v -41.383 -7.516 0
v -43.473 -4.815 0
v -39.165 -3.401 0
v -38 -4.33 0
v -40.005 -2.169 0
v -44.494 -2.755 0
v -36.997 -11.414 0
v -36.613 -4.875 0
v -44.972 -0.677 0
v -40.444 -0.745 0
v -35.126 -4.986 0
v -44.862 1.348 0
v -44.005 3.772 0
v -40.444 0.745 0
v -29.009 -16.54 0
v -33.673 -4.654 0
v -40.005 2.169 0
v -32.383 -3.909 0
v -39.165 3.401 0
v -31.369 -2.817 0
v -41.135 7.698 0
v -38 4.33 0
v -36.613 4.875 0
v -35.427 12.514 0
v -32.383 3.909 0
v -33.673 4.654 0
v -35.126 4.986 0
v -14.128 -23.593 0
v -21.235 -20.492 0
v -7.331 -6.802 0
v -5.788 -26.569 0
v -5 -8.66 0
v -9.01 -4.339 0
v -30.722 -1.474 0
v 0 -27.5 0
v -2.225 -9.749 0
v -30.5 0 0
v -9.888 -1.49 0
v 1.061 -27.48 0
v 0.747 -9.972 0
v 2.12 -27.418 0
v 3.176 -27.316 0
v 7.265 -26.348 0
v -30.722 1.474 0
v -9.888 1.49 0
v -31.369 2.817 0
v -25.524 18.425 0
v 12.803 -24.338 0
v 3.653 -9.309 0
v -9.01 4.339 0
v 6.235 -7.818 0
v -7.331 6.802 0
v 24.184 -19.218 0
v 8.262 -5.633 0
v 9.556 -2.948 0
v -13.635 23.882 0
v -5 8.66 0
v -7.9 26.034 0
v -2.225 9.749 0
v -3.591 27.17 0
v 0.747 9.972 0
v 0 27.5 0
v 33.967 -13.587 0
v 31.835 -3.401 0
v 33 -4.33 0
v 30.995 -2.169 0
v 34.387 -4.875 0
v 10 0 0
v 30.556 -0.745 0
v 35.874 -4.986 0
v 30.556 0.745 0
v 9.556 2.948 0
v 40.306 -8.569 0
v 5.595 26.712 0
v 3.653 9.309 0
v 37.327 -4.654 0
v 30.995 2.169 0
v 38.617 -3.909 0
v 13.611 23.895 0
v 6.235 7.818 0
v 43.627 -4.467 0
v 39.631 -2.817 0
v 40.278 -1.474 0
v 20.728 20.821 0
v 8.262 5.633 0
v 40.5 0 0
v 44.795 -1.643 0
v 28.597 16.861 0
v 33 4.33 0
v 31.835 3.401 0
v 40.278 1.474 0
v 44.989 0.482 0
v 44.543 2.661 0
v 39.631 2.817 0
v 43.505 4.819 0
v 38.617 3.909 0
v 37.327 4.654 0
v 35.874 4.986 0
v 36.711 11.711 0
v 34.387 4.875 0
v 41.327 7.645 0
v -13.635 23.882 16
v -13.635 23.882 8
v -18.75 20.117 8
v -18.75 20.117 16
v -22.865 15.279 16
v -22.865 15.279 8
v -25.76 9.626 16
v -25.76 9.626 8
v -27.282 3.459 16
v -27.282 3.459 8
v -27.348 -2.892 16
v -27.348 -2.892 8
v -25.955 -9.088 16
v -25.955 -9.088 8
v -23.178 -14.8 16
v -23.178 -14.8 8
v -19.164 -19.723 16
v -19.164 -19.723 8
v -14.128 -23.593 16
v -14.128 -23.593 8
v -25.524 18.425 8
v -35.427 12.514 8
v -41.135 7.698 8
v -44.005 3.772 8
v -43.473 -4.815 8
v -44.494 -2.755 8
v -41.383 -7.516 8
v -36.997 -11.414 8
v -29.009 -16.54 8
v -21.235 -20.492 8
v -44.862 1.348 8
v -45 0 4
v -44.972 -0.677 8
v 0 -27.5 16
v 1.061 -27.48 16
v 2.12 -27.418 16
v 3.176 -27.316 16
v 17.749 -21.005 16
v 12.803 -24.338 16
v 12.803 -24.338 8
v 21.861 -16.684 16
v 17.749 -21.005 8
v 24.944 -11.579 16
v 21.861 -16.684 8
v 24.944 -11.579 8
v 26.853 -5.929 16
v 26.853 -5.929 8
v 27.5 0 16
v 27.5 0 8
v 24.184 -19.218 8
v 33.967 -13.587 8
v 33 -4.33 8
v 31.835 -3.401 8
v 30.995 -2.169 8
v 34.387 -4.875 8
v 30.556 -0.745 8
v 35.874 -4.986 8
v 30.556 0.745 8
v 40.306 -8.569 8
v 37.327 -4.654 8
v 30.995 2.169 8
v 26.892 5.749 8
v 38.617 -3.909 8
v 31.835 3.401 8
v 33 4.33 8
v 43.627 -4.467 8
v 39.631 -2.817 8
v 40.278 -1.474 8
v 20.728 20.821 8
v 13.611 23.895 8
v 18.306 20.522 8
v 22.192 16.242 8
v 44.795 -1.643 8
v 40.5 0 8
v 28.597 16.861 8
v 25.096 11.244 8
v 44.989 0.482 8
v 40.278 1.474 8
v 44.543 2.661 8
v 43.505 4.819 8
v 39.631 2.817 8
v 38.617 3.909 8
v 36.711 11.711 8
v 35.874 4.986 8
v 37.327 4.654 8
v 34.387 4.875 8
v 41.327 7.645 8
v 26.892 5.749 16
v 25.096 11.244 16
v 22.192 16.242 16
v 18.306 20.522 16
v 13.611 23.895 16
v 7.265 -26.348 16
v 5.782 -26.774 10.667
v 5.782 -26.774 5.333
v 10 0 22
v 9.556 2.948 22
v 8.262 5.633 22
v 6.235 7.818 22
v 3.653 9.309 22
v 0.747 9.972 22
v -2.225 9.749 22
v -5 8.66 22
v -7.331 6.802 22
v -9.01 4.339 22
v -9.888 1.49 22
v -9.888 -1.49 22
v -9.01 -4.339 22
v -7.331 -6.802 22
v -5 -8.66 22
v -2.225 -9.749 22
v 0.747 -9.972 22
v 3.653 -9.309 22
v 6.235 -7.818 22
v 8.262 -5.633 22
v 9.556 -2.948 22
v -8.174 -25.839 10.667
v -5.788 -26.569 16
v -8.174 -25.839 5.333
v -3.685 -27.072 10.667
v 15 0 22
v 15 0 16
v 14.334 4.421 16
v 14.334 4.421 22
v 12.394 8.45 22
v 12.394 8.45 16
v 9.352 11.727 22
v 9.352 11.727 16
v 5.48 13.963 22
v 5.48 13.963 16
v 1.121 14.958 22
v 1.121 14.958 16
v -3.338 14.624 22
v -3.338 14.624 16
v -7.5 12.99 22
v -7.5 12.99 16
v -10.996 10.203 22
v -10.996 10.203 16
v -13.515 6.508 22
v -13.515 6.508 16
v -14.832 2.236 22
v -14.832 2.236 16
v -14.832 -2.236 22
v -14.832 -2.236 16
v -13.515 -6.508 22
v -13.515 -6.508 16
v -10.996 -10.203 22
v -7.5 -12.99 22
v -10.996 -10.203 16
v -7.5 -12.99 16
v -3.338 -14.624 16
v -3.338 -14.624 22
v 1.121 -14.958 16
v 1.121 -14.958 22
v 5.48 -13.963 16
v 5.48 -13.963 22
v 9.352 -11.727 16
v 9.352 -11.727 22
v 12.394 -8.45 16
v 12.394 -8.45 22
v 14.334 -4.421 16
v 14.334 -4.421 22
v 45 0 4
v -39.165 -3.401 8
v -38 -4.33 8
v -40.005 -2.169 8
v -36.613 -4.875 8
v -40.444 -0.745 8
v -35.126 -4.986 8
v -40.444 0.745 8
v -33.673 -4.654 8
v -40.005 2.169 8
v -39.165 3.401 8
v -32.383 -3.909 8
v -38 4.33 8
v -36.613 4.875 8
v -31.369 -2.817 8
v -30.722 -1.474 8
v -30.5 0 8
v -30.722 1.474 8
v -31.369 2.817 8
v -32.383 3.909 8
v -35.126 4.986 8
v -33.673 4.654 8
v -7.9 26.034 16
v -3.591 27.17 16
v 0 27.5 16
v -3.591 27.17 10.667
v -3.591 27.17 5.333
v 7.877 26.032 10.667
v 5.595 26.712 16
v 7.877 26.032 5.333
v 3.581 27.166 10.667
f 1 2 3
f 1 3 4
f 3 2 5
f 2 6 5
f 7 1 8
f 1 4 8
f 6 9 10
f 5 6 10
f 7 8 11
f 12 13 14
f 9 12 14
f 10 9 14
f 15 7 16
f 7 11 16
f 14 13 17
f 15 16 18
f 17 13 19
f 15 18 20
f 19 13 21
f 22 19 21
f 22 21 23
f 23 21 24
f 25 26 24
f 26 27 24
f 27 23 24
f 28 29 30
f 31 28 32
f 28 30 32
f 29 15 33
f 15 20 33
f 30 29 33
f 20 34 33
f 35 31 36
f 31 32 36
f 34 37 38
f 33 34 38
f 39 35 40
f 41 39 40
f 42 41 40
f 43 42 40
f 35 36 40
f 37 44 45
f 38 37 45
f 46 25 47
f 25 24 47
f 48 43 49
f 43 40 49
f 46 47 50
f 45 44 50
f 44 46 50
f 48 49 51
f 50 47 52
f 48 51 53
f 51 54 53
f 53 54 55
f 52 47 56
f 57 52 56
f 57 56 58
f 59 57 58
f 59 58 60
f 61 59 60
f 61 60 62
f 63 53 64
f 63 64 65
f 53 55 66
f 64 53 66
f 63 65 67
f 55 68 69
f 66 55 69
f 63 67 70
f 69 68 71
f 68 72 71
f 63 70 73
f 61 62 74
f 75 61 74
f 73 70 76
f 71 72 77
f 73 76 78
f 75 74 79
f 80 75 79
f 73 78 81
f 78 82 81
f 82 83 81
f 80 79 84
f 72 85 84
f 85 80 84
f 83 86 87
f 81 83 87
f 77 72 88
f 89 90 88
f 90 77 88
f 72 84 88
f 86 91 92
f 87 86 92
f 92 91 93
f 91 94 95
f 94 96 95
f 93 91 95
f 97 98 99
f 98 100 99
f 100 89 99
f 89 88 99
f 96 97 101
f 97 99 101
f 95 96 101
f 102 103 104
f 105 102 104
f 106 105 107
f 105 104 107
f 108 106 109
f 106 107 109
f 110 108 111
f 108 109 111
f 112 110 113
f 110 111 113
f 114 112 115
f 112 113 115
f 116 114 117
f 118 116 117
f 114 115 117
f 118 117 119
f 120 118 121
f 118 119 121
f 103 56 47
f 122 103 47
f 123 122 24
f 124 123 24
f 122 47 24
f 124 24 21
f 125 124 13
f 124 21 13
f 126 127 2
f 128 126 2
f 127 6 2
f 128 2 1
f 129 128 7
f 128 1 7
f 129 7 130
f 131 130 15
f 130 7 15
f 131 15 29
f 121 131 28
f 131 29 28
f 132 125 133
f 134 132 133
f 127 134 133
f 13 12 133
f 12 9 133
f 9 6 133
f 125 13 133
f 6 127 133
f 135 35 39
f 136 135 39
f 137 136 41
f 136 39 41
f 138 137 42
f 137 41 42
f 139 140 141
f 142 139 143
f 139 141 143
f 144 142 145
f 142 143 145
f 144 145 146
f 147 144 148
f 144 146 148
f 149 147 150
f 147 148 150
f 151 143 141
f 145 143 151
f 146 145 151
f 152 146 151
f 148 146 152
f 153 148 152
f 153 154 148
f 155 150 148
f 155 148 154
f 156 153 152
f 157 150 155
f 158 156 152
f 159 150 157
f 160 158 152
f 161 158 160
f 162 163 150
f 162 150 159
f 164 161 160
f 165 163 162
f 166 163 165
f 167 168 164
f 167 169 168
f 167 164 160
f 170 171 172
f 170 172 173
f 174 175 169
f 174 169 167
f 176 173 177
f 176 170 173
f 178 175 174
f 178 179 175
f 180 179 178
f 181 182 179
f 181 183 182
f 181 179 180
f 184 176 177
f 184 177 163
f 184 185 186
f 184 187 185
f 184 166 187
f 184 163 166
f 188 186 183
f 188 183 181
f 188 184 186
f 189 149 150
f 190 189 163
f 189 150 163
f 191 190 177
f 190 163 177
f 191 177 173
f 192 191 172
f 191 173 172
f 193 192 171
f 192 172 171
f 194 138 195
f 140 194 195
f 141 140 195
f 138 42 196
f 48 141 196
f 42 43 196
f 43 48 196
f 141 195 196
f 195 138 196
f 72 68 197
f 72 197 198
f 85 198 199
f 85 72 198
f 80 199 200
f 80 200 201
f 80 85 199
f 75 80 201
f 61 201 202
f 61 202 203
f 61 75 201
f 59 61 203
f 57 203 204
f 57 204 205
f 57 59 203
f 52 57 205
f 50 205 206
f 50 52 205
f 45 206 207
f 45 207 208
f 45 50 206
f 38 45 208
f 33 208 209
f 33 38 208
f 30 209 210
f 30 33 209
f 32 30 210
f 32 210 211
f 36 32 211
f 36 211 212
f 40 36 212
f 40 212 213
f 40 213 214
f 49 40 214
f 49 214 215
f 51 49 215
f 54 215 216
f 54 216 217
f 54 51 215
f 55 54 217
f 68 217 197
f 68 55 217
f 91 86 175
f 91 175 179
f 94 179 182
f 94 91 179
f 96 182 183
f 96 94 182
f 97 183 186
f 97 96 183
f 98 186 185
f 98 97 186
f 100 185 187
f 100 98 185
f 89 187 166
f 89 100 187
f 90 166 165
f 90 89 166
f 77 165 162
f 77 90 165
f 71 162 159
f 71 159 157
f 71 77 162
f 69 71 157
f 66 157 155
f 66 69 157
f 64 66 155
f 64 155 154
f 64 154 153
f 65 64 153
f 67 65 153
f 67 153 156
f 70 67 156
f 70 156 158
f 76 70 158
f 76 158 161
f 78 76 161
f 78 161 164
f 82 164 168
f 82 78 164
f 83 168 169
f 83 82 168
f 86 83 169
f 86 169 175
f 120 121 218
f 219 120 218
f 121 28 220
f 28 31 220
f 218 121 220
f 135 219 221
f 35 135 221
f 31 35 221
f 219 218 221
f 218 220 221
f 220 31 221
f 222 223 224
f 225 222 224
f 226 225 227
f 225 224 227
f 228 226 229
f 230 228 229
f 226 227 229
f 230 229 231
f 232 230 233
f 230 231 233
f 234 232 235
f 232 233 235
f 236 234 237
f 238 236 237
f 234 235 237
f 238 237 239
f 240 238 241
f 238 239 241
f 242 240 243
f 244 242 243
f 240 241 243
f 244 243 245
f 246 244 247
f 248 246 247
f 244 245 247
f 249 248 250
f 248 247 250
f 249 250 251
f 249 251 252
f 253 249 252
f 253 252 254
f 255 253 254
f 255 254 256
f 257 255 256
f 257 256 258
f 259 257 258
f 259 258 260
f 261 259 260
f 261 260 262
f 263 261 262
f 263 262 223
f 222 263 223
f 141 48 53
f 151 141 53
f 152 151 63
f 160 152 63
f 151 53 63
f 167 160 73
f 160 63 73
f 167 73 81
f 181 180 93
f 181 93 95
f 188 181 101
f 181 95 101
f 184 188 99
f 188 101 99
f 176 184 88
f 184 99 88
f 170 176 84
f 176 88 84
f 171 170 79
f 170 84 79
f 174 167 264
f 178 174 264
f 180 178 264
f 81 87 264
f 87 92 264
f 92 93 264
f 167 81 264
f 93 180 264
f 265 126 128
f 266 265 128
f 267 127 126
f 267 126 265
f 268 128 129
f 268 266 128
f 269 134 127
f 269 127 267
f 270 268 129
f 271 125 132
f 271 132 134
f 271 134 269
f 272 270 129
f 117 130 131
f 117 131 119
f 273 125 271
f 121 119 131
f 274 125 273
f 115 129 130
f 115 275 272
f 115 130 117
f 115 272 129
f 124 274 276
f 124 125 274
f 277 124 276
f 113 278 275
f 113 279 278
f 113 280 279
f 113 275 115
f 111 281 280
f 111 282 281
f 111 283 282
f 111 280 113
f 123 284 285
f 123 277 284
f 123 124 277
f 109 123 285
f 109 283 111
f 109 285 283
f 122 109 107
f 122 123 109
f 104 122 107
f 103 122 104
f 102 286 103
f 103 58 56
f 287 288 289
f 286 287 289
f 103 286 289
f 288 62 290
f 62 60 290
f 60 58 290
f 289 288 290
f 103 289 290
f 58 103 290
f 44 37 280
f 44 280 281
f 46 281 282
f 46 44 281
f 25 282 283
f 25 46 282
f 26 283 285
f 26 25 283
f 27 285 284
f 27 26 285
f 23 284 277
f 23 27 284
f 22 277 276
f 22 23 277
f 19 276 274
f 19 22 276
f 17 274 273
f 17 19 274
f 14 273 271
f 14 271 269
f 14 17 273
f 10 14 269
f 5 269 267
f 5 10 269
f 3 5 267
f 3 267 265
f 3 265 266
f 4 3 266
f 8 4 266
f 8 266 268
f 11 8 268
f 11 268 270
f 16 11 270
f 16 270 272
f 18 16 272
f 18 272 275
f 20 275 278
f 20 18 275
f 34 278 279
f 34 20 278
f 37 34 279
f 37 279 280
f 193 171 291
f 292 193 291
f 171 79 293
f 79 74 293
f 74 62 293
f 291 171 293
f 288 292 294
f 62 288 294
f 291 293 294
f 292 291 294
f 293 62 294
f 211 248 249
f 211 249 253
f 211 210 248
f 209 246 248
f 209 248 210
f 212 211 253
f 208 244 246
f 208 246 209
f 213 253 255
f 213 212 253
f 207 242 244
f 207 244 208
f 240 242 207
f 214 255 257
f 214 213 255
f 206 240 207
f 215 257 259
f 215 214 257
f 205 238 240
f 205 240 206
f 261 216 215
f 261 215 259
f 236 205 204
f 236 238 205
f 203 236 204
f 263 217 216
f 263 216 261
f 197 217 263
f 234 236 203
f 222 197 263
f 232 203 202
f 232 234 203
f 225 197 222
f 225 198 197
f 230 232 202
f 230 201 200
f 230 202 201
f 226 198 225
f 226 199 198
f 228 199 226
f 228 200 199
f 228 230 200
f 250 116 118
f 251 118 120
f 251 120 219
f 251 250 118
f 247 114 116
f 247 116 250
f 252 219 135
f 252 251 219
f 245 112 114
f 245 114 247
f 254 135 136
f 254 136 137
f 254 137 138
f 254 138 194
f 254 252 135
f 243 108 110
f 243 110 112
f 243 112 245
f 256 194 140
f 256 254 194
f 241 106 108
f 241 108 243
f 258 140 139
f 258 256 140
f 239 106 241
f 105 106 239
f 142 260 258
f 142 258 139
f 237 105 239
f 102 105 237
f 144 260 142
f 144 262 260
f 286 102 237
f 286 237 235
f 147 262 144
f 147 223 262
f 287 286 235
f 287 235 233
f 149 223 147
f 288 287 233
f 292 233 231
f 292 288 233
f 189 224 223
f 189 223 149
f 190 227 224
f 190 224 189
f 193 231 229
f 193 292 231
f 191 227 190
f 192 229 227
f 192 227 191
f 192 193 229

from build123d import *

# Parameters (mm, degrees)
F0_R     = 5
F1_DEPTH = 8
F0_R_2   = 15
F2_DEPTH = 16
F0_R_3   = 10
F3_DEPTH = 22


with BuildPart() as f1:
    # F0 (on Top) → F1 (new body)
    with BuildSketch(Plane.XY):
        with BuildLine():
            ThreePointArc((-14.128437921, -23.593160914), (-27.4985146505, 0.2858181561), (-13.6349863045, 23.8817325267))
            add(Edge.make_bspline(
                [(-13.6349863045, 23.8817325267), (-24.80887432, 19.3175732433), (-64.9074286316, -0.0208843712), (-25.3732238209, -18.9980920778), (-14.128437921, -23.593160914)],
                knots=[0.0936300618, 0.0936300618, 0.0936300618, 0.0936300618, 0.2501498665, 0.4055392908, 0.4055392908, 0.4055392908, 0.4055392908], degree=3))
        make_face()
        with Locations((-35.5, 0)):
            Circle(F0_R, mode=Mode.SUBTRACT)
    extrude(amount=F1_DEPTH)



with BuildPart() as f1b:
    # F0 (on Top) → F1, piece 2 (new body)
    with BuildSketch(Plane.XY):
        with BuildLine():
            add(Edge.make_bspline(
                [(12.8034054524, -24.3376828976), (23.9154797228, -19.8963977435), (65.6301130949, 0.0418102706), (24.8166936559, 19.3644997944), (13.6114848151, 23.8951350933)],
                knots=[0.5915126143, 0.5915126143, 0.5915126143, 0.5915126143, 0.7498837302, 0.9064567635, 0.9064567635, 0.9064567635, 0.9064567635], degree=3))
            ThreePointArc((13.6114848151, 23.8951350933), (23.7756790904, 13.8190840432), (27.5, 0))
            ThreePointArc((27.5, 0), (23.5408543806, -14.2154203255), (12.8034054524, -24.3376828976))
        make_face()
        with Locations((35.5, 0)):
            Circle(F0_R, mode=Mode.SUBTRACT)
    extrude(amount=F1_DEPTH)


with BuildPart() as f1_1:
    add(f1.part)

    add(f1b.part)  # F2 merges F1b
    # F0 (on Top) → F2 (join)
    with BuildSketch(Plane.XY):
        with BuildLine():
            add(Edge.make_bspline(
                [(13.6114848151, 23.8951350933), (6.9170274268, 26.6019248892), (3.4653354317, 27.4970657947), (0, 27.5)],
                knots=[0.9064567635, 0.9064567635, 0.9064567635, 0.9064567635, 1, 1, 1, 1], degree=3))
            add(Edge.make_bspline(
                [(0, 27.5), (-3.4685519028, 27.5029369288), (-6.9507725812, 26.6120101235), (-13.6349863045, 23.8817325267)],
                knots=[0, 0, 0, 0, 0.0936300618, 0.0936300618, 0.0936300618, 0.0936300618], degree=3))
            ThreePointArc((-13.6349863045, 23.8817325267), (-27.4985146505, 0.2858181561), (-14.128437921, -23.593160914))
            add(Edge.make_bspline(
                [(-14.128437921, -23.593160914), (-7.2216478267, -26.4155513269), (-3.503029764, -27.4047401273), (0, -27.5)],
                knots=[0.4055392908, 0.4055392908, 0.4055392908, 0.4055392908, 0.5009828275, 0.5009828275, 0.5009828275, 0.5009828275], degree=3))
            ThreePointArc((0, -27.5), (1.5905265483, -27.453965566), (3.1757280792, -27.3160163854))
            add(Edge.make_bspline(
                [(3.1757280792, -27.3160163854), (5.6032444341, -26.9627476234), (8.4443384991, -26.079919214), (12.8034054524, -24.3376828976)],
                knots=[0.5293864729, 0.5293864729, 0.5293864729, 0.5293864729, 0.5915126143, 0.5915126143, 0.5915126143, 0.5915126143], degree=3))
            ThreePointArc((12.8034054524, -24.3376828976), (23.5408543806, -14.2154203255), (27.5, 0))
            ThreePointArc((27.5, 0), (23.7756790904, 13.8190840432), (13.6114848151, 23.8951350933))
        make_face()
        Circle(F0_R_2, mode=Mode.SUBTRACT)
    extrude(amount=F2_DEPTH)

    # F0 (on Top) → F3 (join)
    with BuildSketch(Plane.XY):
        Circle(F0_R_2)
        Circle(F0_R_3, mode=Mode.SUBTRACT)
    extrude(amount=F3_DEPTH)


solid = f1_1.part
